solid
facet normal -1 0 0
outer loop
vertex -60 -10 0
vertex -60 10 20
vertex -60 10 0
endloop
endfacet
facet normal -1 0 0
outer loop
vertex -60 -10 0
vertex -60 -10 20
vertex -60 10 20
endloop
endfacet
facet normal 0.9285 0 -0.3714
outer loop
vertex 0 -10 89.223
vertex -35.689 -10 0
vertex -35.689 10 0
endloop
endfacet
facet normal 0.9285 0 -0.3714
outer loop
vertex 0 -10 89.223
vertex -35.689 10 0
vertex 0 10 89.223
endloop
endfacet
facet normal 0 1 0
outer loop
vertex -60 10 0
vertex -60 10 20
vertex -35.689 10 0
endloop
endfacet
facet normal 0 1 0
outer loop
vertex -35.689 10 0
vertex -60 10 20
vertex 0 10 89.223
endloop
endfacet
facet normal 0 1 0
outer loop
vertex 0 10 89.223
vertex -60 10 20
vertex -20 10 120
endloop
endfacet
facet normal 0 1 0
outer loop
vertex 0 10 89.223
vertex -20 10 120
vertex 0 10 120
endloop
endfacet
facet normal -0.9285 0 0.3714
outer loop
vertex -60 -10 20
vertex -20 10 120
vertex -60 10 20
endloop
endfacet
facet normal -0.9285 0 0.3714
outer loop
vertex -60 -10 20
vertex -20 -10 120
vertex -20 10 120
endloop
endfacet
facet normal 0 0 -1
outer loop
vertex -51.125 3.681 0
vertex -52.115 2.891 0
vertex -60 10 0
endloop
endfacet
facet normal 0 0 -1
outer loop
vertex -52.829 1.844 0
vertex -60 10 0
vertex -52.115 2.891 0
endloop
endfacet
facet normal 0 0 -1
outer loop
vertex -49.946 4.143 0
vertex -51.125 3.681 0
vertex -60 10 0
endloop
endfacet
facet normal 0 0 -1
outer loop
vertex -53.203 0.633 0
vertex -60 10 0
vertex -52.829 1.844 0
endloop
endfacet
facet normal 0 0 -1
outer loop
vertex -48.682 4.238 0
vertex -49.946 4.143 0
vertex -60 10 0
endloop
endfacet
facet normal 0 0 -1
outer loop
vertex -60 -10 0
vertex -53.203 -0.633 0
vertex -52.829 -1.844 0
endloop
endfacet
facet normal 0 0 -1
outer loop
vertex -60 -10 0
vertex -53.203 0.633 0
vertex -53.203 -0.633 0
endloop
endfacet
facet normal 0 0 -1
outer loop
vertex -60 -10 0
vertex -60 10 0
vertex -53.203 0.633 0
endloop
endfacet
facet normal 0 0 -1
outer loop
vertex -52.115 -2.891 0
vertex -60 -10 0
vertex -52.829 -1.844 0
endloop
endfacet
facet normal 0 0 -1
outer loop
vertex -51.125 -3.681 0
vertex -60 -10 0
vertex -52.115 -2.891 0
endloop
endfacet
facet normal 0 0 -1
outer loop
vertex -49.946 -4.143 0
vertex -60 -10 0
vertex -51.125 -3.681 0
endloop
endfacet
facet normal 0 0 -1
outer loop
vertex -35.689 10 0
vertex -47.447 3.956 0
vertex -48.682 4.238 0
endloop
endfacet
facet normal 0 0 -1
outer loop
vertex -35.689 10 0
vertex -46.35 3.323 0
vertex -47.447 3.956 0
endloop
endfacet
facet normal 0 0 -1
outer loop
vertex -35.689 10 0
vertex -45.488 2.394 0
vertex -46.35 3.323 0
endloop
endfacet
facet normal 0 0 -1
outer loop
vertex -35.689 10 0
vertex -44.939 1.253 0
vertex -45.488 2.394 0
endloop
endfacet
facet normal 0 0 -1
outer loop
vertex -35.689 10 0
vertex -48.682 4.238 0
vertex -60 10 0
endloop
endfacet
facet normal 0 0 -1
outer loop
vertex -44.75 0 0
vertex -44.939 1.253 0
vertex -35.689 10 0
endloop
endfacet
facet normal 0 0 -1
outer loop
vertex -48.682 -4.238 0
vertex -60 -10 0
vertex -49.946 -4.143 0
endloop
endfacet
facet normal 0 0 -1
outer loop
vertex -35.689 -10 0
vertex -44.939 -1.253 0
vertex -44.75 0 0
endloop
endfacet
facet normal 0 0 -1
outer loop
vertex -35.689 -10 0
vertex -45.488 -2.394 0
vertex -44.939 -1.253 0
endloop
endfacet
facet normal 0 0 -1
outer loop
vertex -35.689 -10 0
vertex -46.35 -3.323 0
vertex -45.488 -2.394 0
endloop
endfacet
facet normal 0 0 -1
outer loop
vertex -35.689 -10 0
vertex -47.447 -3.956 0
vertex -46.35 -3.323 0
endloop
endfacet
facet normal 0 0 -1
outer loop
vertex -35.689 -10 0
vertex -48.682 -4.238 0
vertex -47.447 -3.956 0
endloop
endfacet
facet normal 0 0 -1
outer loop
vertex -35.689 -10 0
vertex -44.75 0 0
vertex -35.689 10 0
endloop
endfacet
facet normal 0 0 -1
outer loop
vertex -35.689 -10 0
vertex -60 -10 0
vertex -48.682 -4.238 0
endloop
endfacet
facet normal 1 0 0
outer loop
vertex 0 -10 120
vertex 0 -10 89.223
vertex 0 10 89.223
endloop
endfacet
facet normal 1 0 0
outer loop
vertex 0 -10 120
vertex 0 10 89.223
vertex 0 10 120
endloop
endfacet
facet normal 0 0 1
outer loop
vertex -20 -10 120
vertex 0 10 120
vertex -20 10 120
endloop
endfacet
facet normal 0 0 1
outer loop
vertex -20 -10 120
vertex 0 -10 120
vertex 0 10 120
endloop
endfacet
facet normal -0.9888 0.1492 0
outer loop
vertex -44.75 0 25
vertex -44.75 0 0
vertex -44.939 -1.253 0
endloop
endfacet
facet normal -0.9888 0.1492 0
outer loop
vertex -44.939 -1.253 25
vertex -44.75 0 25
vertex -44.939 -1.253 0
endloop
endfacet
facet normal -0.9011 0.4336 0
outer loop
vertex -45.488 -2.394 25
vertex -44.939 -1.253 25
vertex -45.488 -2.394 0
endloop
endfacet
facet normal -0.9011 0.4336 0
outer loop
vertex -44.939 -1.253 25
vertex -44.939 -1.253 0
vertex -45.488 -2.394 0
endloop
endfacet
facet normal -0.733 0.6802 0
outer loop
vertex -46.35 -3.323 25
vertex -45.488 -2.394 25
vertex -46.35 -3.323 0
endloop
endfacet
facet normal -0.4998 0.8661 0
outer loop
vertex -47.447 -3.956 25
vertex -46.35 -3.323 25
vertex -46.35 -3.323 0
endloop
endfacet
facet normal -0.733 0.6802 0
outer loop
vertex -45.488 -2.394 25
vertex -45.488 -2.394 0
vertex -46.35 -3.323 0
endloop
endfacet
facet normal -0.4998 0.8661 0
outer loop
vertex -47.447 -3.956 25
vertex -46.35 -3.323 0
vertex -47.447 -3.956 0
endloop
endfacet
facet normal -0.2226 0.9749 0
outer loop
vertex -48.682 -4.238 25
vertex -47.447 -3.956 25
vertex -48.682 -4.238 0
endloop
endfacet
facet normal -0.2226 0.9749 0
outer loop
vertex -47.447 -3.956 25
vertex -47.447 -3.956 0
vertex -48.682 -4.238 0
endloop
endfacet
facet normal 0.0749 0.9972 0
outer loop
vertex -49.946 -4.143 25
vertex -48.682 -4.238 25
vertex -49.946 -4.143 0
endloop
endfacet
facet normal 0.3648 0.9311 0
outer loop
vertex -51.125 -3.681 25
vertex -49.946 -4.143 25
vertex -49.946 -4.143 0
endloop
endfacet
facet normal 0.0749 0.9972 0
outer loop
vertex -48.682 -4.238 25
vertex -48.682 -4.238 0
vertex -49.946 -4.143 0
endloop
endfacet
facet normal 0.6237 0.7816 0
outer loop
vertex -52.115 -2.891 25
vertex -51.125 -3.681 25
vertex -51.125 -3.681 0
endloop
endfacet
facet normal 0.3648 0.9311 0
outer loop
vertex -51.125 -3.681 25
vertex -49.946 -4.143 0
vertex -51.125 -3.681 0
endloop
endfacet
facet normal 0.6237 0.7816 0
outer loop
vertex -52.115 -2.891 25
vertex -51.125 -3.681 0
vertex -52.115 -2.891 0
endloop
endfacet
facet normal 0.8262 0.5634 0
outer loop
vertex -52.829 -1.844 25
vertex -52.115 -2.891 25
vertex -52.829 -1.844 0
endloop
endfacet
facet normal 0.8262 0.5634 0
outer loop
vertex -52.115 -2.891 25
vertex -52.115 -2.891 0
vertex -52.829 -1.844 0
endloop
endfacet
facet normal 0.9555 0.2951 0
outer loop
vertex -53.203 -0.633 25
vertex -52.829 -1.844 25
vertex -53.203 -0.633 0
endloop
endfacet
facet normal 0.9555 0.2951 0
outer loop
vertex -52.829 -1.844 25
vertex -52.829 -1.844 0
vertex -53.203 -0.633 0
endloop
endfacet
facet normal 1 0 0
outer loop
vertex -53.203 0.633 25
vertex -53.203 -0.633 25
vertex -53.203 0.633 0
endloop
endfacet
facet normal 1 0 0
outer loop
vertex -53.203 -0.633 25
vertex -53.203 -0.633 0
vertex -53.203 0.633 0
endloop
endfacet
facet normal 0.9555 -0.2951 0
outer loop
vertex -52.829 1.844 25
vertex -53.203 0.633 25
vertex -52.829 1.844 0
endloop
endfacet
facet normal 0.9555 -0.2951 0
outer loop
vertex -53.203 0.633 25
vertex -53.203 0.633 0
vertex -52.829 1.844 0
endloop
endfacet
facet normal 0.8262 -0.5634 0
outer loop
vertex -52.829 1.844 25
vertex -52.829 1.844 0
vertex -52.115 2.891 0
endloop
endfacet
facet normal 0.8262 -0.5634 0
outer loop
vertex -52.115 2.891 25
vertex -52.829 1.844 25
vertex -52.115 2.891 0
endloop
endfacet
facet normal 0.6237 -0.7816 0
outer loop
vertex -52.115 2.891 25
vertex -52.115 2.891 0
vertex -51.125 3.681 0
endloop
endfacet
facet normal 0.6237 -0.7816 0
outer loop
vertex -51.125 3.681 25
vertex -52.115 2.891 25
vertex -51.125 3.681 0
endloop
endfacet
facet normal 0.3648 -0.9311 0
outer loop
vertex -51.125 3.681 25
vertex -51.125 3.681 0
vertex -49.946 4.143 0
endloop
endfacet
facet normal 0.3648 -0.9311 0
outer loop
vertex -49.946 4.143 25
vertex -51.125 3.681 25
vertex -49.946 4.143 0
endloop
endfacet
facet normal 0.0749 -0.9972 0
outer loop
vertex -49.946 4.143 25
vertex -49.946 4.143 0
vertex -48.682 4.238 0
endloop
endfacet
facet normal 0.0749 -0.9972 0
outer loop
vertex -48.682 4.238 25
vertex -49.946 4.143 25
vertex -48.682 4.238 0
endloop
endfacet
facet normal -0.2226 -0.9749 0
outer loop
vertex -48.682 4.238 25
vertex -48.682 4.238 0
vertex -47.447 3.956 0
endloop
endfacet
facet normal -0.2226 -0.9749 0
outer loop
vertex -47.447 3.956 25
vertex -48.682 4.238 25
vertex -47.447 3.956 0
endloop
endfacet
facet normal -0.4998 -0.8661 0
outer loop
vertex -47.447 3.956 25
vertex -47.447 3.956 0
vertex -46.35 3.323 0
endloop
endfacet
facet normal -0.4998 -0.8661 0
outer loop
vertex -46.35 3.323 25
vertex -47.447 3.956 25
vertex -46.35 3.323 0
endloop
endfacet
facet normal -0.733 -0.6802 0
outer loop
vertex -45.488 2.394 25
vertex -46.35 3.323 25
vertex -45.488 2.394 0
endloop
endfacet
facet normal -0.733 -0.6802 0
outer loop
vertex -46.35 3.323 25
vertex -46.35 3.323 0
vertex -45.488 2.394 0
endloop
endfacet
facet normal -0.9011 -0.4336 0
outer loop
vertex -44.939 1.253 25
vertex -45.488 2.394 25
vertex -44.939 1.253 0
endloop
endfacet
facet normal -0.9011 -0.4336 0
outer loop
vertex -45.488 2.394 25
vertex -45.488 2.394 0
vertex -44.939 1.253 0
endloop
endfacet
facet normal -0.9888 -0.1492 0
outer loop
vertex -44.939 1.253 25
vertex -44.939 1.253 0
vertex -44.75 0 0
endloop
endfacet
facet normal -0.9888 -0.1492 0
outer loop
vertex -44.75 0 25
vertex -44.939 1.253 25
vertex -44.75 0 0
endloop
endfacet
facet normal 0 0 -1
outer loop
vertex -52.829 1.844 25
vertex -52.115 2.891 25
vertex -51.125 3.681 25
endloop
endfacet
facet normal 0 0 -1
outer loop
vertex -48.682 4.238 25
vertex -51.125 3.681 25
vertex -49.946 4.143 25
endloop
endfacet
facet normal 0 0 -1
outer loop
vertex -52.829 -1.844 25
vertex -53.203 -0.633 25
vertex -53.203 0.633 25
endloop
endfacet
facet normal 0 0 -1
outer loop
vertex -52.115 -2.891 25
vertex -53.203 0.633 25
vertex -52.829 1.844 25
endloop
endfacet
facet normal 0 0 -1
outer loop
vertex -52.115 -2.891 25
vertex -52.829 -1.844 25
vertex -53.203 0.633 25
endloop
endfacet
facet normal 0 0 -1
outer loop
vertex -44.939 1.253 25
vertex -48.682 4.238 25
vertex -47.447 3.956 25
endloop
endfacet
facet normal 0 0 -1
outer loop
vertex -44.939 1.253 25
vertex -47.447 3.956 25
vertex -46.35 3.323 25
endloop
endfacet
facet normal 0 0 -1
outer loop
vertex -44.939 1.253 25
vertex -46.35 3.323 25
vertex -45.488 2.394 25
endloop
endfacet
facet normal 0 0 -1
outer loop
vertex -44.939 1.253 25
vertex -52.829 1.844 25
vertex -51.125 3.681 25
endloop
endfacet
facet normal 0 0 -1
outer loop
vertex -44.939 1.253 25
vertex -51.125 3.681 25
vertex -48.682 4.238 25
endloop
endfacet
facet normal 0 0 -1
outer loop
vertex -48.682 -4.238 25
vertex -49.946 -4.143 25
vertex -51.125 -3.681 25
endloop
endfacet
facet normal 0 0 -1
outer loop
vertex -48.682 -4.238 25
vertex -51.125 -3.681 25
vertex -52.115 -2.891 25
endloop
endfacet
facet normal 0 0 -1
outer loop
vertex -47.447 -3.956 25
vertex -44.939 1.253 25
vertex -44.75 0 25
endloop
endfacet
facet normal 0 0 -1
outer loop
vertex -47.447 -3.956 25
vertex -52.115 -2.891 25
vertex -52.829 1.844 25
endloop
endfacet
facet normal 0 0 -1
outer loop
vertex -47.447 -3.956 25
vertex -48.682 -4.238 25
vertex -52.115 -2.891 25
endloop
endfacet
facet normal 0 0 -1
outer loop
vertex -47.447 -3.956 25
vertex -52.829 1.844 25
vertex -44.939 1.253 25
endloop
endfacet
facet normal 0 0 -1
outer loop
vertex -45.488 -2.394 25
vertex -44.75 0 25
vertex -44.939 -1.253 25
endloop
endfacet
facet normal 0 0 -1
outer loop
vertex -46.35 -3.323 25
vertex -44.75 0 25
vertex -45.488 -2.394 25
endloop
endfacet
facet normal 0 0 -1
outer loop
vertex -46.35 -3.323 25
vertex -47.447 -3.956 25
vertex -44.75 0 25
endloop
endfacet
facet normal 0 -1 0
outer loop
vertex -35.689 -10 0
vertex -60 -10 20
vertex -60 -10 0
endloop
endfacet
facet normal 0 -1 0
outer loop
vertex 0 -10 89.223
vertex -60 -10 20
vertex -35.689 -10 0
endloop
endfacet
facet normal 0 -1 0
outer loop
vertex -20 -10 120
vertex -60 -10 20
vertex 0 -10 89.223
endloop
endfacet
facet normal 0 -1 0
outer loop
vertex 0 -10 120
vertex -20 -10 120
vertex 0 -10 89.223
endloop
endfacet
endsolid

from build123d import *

# Parameters (mm, degrees)
F1_DEPTH = 10
F2_R     = 4.25
F3_DEPTH = 25


with BuildPart() as f1:
    # F0 (on Front) → F1 (new body, symmetric)
    with BuildSketch(Plane.XZ):
        Polygon((-60, 20), (-60, 0), (-35.6890111572, 0), (0, 89.222527893), (0, 120), (-20, 120), align=None)
    extrude(amount=F1_DEPTH, both=True)

    # F2 (on face) → F3 (cut)
    with BuildSketch(Plane(origin=(0, 0, 0), x_dir=(1, 0, 0), z_dir=(0, 0, -1))):
        with Locations((-49, 0)):
            Circle(F2_R)
    extrude(amount=-F3_DEPTH, mode=Mode.SUBTRACT)


solid = f1.part
